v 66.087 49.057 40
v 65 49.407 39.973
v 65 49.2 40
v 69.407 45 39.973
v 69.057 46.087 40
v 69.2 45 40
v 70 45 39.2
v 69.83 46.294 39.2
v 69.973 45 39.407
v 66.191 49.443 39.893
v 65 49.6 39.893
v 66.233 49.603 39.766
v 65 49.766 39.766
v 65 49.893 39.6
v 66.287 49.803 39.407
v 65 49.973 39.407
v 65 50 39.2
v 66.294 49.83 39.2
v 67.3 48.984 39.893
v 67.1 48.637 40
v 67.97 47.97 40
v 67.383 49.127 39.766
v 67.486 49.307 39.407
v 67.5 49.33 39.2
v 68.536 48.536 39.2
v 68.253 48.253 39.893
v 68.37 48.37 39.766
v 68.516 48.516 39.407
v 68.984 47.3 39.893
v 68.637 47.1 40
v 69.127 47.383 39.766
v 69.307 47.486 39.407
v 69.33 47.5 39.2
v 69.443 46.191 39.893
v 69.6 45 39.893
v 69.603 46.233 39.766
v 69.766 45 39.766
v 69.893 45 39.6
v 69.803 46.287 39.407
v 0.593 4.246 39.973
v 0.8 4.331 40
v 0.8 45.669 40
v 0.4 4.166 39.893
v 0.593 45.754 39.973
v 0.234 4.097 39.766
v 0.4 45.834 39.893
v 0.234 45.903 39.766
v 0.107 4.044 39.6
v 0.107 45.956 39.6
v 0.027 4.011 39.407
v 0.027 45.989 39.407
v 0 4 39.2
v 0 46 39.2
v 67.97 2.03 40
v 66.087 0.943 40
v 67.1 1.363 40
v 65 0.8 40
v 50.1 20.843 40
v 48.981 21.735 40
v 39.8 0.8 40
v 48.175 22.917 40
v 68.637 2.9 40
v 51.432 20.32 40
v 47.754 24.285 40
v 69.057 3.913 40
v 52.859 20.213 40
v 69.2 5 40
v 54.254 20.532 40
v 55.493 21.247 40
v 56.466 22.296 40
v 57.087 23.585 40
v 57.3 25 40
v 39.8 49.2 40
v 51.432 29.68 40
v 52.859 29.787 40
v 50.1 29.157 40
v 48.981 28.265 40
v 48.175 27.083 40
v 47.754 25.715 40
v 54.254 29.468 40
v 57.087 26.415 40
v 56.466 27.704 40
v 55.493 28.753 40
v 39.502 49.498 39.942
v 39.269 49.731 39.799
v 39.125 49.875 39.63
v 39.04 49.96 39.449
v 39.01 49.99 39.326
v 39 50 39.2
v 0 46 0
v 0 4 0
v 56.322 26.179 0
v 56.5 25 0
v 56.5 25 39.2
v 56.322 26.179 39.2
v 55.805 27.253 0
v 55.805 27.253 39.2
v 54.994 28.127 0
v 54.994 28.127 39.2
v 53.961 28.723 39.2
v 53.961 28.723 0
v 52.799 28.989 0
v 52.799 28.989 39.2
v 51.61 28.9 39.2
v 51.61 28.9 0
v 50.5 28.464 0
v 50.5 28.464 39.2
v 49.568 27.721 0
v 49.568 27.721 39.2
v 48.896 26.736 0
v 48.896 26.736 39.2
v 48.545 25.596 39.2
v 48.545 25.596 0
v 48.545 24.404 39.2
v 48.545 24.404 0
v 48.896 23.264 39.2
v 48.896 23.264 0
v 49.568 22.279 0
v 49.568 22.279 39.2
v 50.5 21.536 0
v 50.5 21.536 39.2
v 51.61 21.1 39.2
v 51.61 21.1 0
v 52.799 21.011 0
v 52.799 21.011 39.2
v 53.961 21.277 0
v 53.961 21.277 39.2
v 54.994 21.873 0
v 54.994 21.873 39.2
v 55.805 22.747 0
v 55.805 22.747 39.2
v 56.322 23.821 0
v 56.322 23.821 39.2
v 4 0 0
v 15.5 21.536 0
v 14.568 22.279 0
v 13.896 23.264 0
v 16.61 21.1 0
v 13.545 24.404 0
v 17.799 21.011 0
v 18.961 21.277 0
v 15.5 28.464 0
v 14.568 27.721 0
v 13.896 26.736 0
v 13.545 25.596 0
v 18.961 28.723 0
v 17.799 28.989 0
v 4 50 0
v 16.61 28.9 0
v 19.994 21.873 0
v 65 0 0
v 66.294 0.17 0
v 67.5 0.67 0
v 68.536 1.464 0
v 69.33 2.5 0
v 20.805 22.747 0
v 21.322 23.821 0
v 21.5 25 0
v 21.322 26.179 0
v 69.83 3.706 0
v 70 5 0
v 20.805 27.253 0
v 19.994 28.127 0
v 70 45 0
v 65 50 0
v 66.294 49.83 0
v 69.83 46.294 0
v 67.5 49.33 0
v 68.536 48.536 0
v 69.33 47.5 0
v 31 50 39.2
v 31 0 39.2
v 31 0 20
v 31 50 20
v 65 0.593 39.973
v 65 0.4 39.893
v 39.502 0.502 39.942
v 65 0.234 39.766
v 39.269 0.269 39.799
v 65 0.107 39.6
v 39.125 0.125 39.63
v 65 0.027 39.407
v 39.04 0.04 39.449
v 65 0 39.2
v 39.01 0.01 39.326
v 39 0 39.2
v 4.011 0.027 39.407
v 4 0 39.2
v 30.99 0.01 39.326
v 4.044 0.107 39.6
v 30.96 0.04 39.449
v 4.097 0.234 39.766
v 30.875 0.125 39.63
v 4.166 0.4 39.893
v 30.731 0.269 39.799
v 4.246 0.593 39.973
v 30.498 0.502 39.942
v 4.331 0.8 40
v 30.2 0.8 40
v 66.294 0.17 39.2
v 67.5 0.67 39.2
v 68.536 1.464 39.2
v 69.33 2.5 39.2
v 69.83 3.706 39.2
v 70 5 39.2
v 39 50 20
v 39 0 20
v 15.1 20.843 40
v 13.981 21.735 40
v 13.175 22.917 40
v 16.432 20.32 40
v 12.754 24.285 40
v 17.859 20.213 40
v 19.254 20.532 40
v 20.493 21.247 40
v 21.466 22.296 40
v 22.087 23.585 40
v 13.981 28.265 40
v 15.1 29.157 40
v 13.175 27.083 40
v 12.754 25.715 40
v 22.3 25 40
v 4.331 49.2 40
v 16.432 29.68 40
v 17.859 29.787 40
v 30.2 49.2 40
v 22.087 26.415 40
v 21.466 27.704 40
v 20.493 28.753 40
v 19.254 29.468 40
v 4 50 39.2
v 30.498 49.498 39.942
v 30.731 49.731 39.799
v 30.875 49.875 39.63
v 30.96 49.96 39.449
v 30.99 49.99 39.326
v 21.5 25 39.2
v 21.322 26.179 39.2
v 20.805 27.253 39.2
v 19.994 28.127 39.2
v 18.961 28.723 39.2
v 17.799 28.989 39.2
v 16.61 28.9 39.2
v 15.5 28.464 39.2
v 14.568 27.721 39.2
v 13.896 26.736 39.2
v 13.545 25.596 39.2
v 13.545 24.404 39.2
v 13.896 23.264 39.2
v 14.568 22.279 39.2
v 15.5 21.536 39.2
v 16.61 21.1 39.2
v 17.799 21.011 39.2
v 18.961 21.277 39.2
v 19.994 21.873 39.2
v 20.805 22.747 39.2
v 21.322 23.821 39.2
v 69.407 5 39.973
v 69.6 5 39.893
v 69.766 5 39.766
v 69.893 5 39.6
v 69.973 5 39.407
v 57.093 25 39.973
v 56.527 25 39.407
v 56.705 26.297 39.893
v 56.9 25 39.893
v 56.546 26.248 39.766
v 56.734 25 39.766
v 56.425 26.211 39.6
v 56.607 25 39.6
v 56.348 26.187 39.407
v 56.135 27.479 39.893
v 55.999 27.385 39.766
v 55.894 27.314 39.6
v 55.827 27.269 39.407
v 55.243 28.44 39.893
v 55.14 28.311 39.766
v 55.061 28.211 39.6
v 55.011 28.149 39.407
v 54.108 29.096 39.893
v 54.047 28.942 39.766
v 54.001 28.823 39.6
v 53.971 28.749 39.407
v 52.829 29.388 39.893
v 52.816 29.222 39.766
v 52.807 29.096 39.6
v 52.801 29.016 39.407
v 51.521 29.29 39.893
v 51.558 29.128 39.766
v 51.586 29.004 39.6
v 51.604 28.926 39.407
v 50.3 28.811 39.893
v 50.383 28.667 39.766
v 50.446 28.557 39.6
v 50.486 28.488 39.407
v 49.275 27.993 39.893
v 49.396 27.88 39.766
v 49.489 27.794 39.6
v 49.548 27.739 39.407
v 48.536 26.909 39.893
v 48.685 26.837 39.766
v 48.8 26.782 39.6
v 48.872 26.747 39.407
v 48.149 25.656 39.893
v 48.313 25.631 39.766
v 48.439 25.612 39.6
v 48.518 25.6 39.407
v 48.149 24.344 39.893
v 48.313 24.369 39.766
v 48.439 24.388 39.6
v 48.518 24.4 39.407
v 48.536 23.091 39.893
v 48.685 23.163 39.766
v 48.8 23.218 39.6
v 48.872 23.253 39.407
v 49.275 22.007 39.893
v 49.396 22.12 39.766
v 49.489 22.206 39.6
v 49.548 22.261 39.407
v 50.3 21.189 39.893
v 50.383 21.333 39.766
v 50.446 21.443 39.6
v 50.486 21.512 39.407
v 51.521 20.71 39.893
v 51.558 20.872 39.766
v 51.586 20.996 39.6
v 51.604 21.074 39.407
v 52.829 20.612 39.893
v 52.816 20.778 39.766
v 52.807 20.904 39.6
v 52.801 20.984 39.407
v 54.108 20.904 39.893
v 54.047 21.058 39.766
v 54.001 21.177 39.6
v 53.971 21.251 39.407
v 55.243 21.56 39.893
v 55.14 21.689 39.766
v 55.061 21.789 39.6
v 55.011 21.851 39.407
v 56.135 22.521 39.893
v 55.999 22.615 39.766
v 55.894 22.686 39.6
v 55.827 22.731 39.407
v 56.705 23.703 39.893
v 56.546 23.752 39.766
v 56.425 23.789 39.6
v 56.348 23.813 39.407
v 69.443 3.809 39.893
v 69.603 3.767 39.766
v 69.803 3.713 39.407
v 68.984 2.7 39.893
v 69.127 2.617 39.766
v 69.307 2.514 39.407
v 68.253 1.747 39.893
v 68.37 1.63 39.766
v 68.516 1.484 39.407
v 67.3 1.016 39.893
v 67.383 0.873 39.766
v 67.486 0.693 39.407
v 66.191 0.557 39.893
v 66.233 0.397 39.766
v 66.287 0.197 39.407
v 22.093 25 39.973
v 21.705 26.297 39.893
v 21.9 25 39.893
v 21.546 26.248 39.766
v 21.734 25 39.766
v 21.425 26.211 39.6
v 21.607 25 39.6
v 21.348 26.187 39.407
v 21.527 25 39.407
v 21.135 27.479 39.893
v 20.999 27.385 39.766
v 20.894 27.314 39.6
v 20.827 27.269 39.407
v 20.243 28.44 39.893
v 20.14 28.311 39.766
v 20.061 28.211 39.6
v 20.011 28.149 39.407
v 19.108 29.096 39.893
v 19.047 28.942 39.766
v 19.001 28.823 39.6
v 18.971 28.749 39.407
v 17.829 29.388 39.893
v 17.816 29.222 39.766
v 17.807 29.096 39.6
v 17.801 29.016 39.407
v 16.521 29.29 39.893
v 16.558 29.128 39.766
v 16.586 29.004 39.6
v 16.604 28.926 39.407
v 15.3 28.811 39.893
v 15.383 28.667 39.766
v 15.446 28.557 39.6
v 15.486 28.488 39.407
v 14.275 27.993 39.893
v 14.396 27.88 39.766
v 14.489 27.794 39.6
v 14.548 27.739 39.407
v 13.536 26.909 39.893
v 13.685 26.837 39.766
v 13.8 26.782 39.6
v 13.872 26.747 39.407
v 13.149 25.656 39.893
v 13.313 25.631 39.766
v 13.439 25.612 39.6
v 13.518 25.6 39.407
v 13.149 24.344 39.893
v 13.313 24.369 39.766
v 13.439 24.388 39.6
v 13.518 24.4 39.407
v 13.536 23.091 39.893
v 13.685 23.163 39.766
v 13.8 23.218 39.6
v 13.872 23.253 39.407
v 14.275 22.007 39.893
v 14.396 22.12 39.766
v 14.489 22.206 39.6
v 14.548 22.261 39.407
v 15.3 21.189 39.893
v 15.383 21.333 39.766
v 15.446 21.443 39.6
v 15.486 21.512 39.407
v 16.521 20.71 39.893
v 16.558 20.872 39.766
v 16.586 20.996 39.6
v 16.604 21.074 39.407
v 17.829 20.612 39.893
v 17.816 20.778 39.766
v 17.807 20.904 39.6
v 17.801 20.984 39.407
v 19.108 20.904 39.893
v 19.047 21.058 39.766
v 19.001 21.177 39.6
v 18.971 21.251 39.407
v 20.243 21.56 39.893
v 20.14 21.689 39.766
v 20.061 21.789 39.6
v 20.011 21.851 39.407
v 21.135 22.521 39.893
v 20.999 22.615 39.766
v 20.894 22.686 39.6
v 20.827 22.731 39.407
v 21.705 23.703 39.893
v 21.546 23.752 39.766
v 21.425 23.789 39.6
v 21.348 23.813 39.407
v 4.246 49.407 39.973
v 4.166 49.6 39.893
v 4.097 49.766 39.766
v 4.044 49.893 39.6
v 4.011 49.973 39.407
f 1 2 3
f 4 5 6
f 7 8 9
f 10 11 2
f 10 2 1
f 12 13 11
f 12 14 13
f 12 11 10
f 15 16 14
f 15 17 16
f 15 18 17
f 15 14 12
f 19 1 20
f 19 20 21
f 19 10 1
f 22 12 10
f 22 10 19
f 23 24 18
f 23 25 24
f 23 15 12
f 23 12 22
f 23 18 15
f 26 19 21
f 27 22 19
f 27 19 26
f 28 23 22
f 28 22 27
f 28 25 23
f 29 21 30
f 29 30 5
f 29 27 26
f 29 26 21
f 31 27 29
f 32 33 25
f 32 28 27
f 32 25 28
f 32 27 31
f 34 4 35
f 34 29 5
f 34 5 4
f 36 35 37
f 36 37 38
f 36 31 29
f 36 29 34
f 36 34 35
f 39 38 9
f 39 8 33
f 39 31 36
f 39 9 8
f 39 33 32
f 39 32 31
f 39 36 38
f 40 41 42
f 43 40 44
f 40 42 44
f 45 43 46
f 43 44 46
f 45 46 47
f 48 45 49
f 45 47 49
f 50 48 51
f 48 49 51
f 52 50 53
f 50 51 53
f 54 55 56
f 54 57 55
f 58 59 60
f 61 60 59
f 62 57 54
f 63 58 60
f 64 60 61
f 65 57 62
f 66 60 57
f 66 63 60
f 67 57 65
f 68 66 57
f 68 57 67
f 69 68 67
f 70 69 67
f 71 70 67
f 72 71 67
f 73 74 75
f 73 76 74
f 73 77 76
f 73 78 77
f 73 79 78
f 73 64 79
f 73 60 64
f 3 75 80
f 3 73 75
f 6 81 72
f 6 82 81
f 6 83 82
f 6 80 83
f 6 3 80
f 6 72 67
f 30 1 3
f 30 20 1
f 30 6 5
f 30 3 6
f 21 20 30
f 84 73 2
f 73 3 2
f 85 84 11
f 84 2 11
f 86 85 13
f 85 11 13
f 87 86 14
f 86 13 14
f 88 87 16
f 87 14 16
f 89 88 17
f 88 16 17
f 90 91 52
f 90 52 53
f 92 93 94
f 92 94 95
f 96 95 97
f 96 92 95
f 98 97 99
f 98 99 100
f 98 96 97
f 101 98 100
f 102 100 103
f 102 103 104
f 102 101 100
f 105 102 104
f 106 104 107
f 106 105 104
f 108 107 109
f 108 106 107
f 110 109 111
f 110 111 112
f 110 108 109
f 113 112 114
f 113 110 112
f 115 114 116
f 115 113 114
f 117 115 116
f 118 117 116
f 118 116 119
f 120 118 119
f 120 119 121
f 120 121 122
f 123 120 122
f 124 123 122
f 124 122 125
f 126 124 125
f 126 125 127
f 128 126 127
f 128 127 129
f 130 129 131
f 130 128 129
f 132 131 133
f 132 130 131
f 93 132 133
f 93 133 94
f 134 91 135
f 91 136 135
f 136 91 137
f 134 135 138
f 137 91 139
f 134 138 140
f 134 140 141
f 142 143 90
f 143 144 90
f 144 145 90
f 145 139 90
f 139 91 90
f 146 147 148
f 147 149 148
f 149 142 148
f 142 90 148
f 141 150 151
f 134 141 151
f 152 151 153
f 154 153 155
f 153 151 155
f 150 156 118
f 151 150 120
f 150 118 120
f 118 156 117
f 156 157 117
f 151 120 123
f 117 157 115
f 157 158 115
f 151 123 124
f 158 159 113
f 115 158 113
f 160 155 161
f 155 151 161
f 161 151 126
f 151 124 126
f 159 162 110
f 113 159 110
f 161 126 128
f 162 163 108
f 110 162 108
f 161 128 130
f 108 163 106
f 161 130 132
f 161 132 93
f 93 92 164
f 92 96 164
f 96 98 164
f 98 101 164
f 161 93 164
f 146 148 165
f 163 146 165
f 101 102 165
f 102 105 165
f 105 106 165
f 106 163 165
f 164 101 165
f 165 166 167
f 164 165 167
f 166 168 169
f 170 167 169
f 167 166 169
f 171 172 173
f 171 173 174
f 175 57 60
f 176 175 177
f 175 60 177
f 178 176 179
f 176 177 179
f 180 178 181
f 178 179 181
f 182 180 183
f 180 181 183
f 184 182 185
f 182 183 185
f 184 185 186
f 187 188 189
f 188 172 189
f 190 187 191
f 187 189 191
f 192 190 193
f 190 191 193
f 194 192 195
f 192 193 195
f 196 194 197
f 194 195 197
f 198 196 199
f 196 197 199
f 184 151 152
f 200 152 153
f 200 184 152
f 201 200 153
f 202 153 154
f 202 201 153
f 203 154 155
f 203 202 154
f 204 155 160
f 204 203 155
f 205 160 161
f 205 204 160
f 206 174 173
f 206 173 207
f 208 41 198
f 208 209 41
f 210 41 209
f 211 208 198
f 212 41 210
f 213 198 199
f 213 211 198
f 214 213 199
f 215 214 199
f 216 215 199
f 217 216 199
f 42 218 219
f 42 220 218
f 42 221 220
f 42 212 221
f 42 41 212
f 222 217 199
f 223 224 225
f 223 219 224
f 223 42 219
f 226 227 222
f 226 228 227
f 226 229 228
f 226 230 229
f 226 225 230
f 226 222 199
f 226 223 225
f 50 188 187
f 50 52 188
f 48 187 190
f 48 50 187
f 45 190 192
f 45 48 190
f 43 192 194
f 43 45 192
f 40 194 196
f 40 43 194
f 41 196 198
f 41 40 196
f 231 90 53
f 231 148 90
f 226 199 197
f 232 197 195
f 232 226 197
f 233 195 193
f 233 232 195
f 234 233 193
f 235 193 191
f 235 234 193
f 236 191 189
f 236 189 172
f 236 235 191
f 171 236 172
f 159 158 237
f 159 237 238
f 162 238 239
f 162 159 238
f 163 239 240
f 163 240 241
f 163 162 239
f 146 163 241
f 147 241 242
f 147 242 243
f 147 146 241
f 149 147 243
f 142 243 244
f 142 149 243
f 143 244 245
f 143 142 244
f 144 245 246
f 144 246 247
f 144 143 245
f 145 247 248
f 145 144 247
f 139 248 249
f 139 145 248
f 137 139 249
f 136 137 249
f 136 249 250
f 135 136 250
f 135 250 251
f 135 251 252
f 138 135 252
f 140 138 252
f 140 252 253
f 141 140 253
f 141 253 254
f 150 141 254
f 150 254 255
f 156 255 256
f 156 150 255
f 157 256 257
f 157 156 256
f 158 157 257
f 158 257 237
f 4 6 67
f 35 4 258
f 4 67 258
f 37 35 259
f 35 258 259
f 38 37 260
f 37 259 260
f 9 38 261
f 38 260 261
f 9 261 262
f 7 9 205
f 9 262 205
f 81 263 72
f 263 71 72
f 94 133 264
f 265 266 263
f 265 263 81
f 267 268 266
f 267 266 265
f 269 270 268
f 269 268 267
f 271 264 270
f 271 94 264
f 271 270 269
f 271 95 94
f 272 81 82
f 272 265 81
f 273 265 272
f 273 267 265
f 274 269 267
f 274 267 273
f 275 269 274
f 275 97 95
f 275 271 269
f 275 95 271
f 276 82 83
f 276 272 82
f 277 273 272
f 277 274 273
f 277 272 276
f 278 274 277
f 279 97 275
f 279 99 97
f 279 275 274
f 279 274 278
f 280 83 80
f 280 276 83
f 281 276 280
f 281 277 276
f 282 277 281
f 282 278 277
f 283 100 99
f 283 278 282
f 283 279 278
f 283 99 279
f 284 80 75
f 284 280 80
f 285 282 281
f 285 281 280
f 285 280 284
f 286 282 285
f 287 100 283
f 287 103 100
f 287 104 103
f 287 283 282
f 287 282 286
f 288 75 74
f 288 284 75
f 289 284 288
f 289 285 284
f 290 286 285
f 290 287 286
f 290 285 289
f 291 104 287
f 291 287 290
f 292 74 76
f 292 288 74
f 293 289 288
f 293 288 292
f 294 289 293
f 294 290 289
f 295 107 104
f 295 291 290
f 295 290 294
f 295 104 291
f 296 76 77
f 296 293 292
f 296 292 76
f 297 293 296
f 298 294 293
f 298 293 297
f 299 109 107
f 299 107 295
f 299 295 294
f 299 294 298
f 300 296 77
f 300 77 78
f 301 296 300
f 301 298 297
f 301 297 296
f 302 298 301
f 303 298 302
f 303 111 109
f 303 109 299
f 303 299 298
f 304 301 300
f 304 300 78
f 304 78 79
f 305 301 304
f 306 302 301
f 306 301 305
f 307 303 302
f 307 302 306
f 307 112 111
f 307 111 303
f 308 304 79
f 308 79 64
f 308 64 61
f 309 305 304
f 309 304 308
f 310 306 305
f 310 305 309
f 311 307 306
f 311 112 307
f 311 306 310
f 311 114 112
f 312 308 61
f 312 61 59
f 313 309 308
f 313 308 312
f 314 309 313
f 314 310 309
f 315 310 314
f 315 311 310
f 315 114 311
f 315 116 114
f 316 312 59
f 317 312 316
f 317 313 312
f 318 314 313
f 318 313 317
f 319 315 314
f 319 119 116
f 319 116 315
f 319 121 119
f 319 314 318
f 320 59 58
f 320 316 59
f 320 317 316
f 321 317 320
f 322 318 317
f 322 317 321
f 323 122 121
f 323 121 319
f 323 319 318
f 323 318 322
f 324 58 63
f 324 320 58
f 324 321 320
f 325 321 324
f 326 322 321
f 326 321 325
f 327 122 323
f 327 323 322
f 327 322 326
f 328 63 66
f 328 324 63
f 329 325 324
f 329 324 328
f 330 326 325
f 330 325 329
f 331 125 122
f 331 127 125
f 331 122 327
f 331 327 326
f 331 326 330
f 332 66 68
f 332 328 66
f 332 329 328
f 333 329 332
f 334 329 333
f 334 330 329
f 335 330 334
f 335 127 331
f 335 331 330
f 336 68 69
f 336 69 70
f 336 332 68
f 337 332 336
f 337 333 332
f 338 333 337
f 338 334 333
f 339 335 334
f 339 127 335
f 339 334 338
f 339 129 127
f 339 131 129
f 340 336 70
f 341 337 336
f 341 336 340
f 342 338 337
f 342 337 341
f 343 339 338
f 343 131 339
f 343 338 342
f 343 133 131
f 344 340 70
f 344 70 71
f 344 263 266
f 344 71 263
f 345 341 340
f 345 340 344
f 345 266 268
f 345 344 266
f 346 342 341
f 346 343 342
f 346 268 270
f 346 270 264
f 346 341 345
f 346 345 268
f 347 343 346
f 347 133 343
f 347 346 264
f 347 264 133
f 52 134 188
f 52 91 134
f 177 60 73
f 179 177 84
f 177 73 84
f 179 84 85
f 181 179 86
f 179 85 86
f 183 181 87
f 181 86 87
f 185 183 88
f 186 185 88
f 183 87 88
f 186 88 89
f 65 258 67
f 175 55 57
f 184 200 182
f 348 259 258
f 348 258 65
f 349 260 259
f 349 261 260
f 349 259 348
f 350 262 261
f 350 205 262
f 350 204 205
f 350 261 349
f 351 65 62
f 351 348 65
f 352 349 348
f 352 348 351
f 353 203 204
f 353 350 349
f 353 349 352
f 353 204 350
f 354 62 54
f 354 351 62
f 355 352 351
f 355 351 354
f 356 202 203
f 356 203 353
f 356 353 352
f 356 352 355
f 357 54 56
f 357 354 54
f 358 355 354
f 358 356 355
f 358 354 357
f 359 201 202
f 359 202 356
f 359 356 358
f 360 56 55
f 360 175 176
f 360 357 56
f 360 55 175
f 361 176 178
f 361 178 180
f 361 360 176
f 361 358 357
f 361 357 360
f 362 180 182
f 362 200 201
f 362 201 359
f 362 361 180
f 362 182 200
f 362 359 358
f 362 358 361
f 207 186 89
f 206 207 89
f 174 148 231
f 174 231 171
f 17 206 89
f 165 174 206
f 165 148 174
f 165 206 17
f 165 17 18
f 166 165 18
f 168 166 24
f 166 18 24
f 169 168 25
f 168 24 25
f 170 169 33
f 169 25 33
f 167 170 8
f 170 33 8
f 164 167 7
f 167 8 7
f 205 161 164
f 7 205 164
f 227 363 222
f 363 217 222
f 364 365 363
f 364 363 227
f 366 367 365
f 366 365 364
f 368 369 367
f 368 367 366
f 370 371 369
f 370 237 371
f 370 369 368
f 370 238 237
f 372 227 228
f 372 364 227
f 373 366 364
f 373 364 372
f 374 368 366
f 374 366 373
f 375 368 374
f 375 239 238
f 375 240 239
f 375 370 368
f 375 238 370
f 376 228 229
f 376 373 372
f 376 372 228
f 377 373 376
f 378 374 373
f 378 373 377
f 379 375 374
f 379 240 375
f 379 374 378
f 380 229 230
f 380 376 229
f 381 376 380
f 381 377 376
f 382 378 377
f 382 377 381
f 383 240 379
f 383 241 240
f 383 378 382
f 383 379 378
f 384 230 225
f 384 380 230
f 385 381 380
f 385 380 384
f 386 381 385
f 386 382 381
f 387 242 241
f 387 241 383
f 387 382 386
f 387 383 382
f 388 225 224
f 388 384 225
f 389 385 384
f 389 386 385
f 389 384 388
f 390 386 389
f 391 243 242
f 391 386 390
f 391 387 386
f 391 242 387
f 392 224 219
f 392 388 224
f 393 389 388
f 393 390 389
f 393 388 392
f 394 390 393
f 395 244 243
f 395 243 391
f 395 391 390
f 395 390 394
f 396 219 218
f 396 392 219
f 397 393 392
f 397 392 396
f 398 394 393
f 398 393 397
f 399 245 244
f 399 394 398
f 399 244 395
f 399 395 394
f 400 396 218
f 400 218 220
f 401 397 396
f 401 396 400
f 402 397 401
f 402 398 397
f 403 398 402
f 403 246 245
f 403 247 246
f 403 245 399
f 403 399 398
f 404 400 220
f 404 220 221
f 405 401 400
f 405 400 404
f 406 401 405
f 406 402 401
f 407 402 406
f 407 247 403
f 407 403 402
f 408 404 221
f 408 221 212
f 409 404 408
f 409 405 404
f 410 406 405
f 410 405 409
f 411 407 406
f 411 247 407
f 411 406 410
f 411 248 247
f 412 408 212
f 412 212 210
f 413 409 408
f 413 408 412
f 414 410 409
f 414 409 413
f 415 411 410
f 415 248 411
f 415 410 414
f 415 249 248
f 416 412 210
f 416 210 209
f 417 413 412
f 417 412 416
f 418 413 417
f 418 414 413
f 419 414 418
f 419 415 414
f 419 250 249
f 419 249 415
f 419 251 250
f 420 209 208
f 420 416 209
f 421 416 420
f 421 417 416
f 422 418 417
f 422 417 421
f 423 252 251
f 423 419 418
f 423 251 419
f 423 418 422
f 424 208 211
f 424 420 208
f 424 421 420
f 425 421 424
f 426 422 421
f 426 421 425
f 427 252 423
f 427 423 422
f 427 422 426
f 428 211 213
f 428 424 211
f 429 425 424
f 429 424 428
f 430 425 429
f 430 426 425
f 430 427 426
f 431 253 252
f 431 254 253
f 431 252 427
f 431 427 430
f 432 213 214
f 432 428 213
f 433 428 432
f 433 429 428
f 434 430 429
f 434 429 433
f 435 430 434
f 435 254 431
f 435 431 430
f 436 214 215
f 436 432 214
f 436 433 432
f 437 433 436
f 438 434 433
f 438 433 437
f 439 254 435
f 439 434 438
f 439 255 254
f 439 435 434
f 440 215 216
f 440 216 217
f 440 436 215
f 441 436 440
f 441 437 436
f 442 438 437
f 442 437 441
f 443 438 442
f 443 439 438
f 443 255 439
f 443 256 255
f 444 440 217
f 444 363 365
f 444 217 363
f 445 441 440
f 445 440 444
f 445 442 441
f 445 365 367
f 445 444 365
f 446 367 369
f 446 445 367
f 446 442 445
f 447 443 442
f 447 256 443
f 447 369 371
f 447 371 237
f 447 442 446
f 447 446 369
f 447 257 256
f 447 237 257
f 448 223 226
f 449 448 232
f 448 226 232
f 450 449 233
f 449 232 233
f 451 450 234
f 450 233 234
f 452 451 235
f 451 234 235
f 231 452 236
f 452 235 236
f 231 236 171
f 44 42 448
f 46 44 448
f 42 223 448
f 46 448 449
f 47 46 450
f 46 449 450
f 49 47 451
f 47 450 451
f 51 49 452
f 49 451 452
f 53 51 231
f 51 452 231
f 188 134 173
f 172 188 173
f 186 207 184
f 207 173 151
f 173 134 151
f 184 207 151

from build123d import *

# Parameters (mm, degrees)
SKETCH_W     = 70
SKETCH_H     = 50
SKETCH_R     = 4
PAD_DEPTH    = 40
SKETCH001_W  = 8
SKETCH001_H  = 50
POCKET_DEPTH = 20
FILLET_R     = 5
CHAMFER_SIZE = 4
FILLET001_R  = 0.8
FILLET002_R  = 0.8


with BuildPart() as part:
    # Sketch → Pad (new body)
    with BuildSketch(Plane.XY):
        with Locations((35, 25)):
            Rectangle(SKETCH_W, SKETCH_H)
        with Locations((17.5, 25)):
            Circle(SKETCH_R, mode=Mode.SUBTRACT)
        with Locations((52.5, 25)):
            Circle(SKETCH_R, mode=Mode.SUBTRACT)
    extrude(amount=PAD_DEPTH)

    # Sketch001 (on Face8 of Pad) → Pocket (cut)
    with BuildSketch(Plane.XY.offset(40)):
        with Locations((35, 25)):
            Rectangle(SKETCH001_W, SKETCH001_H)
    extrude(amount=-POCKET_DEPTH, mode=Mode.SUBTRACT)

    # Fillet
    fillet_edges = [part.edges().sort_by_distance(p)[0] for p in [
        (70, 0, 20),
        (70, 50, 20),
    ]]
    fillet(fillet_edges, radius=FILLET_R)

    # Chamfer
    chamfer_edges = [part.edges().sort_by_distance(p)[0] for p in [
        (0, 50, 20),
        (0, 0, 20),
    ]]
    chamfer(chamfer_edges, length=CHAMFER_SIZE)

    # Fillet001
    fillet001_edges = [part.edges().sort_by_distance(p)[0] for p in [
        (52, 50, 40),
        (68.535534, 48.535534, 40),
        (39, 25, 40),
        (70, 25, 40),
        (52, 0, 40),
        (68.535534, 1.464466, 40),
        (48.5, 25, 40),
    ]]
    fillet(fillet001_edges, radius=FILLET001_R)

    # Fillet002
    fillet002_edges = [part.edges().sort_by_distance(p)[0] for p in [
        (17.5, 50, 40),
        (2, 48, 40),
        (31, 25, 40),
        (0, 25, 40),
        (17.5, 0, 40),
        (2, 2, 40),
        (13.5, 25, 40),
    ]]
    fillet(fillet002_edges, radius=FILLET002_R)


solid = part.part
